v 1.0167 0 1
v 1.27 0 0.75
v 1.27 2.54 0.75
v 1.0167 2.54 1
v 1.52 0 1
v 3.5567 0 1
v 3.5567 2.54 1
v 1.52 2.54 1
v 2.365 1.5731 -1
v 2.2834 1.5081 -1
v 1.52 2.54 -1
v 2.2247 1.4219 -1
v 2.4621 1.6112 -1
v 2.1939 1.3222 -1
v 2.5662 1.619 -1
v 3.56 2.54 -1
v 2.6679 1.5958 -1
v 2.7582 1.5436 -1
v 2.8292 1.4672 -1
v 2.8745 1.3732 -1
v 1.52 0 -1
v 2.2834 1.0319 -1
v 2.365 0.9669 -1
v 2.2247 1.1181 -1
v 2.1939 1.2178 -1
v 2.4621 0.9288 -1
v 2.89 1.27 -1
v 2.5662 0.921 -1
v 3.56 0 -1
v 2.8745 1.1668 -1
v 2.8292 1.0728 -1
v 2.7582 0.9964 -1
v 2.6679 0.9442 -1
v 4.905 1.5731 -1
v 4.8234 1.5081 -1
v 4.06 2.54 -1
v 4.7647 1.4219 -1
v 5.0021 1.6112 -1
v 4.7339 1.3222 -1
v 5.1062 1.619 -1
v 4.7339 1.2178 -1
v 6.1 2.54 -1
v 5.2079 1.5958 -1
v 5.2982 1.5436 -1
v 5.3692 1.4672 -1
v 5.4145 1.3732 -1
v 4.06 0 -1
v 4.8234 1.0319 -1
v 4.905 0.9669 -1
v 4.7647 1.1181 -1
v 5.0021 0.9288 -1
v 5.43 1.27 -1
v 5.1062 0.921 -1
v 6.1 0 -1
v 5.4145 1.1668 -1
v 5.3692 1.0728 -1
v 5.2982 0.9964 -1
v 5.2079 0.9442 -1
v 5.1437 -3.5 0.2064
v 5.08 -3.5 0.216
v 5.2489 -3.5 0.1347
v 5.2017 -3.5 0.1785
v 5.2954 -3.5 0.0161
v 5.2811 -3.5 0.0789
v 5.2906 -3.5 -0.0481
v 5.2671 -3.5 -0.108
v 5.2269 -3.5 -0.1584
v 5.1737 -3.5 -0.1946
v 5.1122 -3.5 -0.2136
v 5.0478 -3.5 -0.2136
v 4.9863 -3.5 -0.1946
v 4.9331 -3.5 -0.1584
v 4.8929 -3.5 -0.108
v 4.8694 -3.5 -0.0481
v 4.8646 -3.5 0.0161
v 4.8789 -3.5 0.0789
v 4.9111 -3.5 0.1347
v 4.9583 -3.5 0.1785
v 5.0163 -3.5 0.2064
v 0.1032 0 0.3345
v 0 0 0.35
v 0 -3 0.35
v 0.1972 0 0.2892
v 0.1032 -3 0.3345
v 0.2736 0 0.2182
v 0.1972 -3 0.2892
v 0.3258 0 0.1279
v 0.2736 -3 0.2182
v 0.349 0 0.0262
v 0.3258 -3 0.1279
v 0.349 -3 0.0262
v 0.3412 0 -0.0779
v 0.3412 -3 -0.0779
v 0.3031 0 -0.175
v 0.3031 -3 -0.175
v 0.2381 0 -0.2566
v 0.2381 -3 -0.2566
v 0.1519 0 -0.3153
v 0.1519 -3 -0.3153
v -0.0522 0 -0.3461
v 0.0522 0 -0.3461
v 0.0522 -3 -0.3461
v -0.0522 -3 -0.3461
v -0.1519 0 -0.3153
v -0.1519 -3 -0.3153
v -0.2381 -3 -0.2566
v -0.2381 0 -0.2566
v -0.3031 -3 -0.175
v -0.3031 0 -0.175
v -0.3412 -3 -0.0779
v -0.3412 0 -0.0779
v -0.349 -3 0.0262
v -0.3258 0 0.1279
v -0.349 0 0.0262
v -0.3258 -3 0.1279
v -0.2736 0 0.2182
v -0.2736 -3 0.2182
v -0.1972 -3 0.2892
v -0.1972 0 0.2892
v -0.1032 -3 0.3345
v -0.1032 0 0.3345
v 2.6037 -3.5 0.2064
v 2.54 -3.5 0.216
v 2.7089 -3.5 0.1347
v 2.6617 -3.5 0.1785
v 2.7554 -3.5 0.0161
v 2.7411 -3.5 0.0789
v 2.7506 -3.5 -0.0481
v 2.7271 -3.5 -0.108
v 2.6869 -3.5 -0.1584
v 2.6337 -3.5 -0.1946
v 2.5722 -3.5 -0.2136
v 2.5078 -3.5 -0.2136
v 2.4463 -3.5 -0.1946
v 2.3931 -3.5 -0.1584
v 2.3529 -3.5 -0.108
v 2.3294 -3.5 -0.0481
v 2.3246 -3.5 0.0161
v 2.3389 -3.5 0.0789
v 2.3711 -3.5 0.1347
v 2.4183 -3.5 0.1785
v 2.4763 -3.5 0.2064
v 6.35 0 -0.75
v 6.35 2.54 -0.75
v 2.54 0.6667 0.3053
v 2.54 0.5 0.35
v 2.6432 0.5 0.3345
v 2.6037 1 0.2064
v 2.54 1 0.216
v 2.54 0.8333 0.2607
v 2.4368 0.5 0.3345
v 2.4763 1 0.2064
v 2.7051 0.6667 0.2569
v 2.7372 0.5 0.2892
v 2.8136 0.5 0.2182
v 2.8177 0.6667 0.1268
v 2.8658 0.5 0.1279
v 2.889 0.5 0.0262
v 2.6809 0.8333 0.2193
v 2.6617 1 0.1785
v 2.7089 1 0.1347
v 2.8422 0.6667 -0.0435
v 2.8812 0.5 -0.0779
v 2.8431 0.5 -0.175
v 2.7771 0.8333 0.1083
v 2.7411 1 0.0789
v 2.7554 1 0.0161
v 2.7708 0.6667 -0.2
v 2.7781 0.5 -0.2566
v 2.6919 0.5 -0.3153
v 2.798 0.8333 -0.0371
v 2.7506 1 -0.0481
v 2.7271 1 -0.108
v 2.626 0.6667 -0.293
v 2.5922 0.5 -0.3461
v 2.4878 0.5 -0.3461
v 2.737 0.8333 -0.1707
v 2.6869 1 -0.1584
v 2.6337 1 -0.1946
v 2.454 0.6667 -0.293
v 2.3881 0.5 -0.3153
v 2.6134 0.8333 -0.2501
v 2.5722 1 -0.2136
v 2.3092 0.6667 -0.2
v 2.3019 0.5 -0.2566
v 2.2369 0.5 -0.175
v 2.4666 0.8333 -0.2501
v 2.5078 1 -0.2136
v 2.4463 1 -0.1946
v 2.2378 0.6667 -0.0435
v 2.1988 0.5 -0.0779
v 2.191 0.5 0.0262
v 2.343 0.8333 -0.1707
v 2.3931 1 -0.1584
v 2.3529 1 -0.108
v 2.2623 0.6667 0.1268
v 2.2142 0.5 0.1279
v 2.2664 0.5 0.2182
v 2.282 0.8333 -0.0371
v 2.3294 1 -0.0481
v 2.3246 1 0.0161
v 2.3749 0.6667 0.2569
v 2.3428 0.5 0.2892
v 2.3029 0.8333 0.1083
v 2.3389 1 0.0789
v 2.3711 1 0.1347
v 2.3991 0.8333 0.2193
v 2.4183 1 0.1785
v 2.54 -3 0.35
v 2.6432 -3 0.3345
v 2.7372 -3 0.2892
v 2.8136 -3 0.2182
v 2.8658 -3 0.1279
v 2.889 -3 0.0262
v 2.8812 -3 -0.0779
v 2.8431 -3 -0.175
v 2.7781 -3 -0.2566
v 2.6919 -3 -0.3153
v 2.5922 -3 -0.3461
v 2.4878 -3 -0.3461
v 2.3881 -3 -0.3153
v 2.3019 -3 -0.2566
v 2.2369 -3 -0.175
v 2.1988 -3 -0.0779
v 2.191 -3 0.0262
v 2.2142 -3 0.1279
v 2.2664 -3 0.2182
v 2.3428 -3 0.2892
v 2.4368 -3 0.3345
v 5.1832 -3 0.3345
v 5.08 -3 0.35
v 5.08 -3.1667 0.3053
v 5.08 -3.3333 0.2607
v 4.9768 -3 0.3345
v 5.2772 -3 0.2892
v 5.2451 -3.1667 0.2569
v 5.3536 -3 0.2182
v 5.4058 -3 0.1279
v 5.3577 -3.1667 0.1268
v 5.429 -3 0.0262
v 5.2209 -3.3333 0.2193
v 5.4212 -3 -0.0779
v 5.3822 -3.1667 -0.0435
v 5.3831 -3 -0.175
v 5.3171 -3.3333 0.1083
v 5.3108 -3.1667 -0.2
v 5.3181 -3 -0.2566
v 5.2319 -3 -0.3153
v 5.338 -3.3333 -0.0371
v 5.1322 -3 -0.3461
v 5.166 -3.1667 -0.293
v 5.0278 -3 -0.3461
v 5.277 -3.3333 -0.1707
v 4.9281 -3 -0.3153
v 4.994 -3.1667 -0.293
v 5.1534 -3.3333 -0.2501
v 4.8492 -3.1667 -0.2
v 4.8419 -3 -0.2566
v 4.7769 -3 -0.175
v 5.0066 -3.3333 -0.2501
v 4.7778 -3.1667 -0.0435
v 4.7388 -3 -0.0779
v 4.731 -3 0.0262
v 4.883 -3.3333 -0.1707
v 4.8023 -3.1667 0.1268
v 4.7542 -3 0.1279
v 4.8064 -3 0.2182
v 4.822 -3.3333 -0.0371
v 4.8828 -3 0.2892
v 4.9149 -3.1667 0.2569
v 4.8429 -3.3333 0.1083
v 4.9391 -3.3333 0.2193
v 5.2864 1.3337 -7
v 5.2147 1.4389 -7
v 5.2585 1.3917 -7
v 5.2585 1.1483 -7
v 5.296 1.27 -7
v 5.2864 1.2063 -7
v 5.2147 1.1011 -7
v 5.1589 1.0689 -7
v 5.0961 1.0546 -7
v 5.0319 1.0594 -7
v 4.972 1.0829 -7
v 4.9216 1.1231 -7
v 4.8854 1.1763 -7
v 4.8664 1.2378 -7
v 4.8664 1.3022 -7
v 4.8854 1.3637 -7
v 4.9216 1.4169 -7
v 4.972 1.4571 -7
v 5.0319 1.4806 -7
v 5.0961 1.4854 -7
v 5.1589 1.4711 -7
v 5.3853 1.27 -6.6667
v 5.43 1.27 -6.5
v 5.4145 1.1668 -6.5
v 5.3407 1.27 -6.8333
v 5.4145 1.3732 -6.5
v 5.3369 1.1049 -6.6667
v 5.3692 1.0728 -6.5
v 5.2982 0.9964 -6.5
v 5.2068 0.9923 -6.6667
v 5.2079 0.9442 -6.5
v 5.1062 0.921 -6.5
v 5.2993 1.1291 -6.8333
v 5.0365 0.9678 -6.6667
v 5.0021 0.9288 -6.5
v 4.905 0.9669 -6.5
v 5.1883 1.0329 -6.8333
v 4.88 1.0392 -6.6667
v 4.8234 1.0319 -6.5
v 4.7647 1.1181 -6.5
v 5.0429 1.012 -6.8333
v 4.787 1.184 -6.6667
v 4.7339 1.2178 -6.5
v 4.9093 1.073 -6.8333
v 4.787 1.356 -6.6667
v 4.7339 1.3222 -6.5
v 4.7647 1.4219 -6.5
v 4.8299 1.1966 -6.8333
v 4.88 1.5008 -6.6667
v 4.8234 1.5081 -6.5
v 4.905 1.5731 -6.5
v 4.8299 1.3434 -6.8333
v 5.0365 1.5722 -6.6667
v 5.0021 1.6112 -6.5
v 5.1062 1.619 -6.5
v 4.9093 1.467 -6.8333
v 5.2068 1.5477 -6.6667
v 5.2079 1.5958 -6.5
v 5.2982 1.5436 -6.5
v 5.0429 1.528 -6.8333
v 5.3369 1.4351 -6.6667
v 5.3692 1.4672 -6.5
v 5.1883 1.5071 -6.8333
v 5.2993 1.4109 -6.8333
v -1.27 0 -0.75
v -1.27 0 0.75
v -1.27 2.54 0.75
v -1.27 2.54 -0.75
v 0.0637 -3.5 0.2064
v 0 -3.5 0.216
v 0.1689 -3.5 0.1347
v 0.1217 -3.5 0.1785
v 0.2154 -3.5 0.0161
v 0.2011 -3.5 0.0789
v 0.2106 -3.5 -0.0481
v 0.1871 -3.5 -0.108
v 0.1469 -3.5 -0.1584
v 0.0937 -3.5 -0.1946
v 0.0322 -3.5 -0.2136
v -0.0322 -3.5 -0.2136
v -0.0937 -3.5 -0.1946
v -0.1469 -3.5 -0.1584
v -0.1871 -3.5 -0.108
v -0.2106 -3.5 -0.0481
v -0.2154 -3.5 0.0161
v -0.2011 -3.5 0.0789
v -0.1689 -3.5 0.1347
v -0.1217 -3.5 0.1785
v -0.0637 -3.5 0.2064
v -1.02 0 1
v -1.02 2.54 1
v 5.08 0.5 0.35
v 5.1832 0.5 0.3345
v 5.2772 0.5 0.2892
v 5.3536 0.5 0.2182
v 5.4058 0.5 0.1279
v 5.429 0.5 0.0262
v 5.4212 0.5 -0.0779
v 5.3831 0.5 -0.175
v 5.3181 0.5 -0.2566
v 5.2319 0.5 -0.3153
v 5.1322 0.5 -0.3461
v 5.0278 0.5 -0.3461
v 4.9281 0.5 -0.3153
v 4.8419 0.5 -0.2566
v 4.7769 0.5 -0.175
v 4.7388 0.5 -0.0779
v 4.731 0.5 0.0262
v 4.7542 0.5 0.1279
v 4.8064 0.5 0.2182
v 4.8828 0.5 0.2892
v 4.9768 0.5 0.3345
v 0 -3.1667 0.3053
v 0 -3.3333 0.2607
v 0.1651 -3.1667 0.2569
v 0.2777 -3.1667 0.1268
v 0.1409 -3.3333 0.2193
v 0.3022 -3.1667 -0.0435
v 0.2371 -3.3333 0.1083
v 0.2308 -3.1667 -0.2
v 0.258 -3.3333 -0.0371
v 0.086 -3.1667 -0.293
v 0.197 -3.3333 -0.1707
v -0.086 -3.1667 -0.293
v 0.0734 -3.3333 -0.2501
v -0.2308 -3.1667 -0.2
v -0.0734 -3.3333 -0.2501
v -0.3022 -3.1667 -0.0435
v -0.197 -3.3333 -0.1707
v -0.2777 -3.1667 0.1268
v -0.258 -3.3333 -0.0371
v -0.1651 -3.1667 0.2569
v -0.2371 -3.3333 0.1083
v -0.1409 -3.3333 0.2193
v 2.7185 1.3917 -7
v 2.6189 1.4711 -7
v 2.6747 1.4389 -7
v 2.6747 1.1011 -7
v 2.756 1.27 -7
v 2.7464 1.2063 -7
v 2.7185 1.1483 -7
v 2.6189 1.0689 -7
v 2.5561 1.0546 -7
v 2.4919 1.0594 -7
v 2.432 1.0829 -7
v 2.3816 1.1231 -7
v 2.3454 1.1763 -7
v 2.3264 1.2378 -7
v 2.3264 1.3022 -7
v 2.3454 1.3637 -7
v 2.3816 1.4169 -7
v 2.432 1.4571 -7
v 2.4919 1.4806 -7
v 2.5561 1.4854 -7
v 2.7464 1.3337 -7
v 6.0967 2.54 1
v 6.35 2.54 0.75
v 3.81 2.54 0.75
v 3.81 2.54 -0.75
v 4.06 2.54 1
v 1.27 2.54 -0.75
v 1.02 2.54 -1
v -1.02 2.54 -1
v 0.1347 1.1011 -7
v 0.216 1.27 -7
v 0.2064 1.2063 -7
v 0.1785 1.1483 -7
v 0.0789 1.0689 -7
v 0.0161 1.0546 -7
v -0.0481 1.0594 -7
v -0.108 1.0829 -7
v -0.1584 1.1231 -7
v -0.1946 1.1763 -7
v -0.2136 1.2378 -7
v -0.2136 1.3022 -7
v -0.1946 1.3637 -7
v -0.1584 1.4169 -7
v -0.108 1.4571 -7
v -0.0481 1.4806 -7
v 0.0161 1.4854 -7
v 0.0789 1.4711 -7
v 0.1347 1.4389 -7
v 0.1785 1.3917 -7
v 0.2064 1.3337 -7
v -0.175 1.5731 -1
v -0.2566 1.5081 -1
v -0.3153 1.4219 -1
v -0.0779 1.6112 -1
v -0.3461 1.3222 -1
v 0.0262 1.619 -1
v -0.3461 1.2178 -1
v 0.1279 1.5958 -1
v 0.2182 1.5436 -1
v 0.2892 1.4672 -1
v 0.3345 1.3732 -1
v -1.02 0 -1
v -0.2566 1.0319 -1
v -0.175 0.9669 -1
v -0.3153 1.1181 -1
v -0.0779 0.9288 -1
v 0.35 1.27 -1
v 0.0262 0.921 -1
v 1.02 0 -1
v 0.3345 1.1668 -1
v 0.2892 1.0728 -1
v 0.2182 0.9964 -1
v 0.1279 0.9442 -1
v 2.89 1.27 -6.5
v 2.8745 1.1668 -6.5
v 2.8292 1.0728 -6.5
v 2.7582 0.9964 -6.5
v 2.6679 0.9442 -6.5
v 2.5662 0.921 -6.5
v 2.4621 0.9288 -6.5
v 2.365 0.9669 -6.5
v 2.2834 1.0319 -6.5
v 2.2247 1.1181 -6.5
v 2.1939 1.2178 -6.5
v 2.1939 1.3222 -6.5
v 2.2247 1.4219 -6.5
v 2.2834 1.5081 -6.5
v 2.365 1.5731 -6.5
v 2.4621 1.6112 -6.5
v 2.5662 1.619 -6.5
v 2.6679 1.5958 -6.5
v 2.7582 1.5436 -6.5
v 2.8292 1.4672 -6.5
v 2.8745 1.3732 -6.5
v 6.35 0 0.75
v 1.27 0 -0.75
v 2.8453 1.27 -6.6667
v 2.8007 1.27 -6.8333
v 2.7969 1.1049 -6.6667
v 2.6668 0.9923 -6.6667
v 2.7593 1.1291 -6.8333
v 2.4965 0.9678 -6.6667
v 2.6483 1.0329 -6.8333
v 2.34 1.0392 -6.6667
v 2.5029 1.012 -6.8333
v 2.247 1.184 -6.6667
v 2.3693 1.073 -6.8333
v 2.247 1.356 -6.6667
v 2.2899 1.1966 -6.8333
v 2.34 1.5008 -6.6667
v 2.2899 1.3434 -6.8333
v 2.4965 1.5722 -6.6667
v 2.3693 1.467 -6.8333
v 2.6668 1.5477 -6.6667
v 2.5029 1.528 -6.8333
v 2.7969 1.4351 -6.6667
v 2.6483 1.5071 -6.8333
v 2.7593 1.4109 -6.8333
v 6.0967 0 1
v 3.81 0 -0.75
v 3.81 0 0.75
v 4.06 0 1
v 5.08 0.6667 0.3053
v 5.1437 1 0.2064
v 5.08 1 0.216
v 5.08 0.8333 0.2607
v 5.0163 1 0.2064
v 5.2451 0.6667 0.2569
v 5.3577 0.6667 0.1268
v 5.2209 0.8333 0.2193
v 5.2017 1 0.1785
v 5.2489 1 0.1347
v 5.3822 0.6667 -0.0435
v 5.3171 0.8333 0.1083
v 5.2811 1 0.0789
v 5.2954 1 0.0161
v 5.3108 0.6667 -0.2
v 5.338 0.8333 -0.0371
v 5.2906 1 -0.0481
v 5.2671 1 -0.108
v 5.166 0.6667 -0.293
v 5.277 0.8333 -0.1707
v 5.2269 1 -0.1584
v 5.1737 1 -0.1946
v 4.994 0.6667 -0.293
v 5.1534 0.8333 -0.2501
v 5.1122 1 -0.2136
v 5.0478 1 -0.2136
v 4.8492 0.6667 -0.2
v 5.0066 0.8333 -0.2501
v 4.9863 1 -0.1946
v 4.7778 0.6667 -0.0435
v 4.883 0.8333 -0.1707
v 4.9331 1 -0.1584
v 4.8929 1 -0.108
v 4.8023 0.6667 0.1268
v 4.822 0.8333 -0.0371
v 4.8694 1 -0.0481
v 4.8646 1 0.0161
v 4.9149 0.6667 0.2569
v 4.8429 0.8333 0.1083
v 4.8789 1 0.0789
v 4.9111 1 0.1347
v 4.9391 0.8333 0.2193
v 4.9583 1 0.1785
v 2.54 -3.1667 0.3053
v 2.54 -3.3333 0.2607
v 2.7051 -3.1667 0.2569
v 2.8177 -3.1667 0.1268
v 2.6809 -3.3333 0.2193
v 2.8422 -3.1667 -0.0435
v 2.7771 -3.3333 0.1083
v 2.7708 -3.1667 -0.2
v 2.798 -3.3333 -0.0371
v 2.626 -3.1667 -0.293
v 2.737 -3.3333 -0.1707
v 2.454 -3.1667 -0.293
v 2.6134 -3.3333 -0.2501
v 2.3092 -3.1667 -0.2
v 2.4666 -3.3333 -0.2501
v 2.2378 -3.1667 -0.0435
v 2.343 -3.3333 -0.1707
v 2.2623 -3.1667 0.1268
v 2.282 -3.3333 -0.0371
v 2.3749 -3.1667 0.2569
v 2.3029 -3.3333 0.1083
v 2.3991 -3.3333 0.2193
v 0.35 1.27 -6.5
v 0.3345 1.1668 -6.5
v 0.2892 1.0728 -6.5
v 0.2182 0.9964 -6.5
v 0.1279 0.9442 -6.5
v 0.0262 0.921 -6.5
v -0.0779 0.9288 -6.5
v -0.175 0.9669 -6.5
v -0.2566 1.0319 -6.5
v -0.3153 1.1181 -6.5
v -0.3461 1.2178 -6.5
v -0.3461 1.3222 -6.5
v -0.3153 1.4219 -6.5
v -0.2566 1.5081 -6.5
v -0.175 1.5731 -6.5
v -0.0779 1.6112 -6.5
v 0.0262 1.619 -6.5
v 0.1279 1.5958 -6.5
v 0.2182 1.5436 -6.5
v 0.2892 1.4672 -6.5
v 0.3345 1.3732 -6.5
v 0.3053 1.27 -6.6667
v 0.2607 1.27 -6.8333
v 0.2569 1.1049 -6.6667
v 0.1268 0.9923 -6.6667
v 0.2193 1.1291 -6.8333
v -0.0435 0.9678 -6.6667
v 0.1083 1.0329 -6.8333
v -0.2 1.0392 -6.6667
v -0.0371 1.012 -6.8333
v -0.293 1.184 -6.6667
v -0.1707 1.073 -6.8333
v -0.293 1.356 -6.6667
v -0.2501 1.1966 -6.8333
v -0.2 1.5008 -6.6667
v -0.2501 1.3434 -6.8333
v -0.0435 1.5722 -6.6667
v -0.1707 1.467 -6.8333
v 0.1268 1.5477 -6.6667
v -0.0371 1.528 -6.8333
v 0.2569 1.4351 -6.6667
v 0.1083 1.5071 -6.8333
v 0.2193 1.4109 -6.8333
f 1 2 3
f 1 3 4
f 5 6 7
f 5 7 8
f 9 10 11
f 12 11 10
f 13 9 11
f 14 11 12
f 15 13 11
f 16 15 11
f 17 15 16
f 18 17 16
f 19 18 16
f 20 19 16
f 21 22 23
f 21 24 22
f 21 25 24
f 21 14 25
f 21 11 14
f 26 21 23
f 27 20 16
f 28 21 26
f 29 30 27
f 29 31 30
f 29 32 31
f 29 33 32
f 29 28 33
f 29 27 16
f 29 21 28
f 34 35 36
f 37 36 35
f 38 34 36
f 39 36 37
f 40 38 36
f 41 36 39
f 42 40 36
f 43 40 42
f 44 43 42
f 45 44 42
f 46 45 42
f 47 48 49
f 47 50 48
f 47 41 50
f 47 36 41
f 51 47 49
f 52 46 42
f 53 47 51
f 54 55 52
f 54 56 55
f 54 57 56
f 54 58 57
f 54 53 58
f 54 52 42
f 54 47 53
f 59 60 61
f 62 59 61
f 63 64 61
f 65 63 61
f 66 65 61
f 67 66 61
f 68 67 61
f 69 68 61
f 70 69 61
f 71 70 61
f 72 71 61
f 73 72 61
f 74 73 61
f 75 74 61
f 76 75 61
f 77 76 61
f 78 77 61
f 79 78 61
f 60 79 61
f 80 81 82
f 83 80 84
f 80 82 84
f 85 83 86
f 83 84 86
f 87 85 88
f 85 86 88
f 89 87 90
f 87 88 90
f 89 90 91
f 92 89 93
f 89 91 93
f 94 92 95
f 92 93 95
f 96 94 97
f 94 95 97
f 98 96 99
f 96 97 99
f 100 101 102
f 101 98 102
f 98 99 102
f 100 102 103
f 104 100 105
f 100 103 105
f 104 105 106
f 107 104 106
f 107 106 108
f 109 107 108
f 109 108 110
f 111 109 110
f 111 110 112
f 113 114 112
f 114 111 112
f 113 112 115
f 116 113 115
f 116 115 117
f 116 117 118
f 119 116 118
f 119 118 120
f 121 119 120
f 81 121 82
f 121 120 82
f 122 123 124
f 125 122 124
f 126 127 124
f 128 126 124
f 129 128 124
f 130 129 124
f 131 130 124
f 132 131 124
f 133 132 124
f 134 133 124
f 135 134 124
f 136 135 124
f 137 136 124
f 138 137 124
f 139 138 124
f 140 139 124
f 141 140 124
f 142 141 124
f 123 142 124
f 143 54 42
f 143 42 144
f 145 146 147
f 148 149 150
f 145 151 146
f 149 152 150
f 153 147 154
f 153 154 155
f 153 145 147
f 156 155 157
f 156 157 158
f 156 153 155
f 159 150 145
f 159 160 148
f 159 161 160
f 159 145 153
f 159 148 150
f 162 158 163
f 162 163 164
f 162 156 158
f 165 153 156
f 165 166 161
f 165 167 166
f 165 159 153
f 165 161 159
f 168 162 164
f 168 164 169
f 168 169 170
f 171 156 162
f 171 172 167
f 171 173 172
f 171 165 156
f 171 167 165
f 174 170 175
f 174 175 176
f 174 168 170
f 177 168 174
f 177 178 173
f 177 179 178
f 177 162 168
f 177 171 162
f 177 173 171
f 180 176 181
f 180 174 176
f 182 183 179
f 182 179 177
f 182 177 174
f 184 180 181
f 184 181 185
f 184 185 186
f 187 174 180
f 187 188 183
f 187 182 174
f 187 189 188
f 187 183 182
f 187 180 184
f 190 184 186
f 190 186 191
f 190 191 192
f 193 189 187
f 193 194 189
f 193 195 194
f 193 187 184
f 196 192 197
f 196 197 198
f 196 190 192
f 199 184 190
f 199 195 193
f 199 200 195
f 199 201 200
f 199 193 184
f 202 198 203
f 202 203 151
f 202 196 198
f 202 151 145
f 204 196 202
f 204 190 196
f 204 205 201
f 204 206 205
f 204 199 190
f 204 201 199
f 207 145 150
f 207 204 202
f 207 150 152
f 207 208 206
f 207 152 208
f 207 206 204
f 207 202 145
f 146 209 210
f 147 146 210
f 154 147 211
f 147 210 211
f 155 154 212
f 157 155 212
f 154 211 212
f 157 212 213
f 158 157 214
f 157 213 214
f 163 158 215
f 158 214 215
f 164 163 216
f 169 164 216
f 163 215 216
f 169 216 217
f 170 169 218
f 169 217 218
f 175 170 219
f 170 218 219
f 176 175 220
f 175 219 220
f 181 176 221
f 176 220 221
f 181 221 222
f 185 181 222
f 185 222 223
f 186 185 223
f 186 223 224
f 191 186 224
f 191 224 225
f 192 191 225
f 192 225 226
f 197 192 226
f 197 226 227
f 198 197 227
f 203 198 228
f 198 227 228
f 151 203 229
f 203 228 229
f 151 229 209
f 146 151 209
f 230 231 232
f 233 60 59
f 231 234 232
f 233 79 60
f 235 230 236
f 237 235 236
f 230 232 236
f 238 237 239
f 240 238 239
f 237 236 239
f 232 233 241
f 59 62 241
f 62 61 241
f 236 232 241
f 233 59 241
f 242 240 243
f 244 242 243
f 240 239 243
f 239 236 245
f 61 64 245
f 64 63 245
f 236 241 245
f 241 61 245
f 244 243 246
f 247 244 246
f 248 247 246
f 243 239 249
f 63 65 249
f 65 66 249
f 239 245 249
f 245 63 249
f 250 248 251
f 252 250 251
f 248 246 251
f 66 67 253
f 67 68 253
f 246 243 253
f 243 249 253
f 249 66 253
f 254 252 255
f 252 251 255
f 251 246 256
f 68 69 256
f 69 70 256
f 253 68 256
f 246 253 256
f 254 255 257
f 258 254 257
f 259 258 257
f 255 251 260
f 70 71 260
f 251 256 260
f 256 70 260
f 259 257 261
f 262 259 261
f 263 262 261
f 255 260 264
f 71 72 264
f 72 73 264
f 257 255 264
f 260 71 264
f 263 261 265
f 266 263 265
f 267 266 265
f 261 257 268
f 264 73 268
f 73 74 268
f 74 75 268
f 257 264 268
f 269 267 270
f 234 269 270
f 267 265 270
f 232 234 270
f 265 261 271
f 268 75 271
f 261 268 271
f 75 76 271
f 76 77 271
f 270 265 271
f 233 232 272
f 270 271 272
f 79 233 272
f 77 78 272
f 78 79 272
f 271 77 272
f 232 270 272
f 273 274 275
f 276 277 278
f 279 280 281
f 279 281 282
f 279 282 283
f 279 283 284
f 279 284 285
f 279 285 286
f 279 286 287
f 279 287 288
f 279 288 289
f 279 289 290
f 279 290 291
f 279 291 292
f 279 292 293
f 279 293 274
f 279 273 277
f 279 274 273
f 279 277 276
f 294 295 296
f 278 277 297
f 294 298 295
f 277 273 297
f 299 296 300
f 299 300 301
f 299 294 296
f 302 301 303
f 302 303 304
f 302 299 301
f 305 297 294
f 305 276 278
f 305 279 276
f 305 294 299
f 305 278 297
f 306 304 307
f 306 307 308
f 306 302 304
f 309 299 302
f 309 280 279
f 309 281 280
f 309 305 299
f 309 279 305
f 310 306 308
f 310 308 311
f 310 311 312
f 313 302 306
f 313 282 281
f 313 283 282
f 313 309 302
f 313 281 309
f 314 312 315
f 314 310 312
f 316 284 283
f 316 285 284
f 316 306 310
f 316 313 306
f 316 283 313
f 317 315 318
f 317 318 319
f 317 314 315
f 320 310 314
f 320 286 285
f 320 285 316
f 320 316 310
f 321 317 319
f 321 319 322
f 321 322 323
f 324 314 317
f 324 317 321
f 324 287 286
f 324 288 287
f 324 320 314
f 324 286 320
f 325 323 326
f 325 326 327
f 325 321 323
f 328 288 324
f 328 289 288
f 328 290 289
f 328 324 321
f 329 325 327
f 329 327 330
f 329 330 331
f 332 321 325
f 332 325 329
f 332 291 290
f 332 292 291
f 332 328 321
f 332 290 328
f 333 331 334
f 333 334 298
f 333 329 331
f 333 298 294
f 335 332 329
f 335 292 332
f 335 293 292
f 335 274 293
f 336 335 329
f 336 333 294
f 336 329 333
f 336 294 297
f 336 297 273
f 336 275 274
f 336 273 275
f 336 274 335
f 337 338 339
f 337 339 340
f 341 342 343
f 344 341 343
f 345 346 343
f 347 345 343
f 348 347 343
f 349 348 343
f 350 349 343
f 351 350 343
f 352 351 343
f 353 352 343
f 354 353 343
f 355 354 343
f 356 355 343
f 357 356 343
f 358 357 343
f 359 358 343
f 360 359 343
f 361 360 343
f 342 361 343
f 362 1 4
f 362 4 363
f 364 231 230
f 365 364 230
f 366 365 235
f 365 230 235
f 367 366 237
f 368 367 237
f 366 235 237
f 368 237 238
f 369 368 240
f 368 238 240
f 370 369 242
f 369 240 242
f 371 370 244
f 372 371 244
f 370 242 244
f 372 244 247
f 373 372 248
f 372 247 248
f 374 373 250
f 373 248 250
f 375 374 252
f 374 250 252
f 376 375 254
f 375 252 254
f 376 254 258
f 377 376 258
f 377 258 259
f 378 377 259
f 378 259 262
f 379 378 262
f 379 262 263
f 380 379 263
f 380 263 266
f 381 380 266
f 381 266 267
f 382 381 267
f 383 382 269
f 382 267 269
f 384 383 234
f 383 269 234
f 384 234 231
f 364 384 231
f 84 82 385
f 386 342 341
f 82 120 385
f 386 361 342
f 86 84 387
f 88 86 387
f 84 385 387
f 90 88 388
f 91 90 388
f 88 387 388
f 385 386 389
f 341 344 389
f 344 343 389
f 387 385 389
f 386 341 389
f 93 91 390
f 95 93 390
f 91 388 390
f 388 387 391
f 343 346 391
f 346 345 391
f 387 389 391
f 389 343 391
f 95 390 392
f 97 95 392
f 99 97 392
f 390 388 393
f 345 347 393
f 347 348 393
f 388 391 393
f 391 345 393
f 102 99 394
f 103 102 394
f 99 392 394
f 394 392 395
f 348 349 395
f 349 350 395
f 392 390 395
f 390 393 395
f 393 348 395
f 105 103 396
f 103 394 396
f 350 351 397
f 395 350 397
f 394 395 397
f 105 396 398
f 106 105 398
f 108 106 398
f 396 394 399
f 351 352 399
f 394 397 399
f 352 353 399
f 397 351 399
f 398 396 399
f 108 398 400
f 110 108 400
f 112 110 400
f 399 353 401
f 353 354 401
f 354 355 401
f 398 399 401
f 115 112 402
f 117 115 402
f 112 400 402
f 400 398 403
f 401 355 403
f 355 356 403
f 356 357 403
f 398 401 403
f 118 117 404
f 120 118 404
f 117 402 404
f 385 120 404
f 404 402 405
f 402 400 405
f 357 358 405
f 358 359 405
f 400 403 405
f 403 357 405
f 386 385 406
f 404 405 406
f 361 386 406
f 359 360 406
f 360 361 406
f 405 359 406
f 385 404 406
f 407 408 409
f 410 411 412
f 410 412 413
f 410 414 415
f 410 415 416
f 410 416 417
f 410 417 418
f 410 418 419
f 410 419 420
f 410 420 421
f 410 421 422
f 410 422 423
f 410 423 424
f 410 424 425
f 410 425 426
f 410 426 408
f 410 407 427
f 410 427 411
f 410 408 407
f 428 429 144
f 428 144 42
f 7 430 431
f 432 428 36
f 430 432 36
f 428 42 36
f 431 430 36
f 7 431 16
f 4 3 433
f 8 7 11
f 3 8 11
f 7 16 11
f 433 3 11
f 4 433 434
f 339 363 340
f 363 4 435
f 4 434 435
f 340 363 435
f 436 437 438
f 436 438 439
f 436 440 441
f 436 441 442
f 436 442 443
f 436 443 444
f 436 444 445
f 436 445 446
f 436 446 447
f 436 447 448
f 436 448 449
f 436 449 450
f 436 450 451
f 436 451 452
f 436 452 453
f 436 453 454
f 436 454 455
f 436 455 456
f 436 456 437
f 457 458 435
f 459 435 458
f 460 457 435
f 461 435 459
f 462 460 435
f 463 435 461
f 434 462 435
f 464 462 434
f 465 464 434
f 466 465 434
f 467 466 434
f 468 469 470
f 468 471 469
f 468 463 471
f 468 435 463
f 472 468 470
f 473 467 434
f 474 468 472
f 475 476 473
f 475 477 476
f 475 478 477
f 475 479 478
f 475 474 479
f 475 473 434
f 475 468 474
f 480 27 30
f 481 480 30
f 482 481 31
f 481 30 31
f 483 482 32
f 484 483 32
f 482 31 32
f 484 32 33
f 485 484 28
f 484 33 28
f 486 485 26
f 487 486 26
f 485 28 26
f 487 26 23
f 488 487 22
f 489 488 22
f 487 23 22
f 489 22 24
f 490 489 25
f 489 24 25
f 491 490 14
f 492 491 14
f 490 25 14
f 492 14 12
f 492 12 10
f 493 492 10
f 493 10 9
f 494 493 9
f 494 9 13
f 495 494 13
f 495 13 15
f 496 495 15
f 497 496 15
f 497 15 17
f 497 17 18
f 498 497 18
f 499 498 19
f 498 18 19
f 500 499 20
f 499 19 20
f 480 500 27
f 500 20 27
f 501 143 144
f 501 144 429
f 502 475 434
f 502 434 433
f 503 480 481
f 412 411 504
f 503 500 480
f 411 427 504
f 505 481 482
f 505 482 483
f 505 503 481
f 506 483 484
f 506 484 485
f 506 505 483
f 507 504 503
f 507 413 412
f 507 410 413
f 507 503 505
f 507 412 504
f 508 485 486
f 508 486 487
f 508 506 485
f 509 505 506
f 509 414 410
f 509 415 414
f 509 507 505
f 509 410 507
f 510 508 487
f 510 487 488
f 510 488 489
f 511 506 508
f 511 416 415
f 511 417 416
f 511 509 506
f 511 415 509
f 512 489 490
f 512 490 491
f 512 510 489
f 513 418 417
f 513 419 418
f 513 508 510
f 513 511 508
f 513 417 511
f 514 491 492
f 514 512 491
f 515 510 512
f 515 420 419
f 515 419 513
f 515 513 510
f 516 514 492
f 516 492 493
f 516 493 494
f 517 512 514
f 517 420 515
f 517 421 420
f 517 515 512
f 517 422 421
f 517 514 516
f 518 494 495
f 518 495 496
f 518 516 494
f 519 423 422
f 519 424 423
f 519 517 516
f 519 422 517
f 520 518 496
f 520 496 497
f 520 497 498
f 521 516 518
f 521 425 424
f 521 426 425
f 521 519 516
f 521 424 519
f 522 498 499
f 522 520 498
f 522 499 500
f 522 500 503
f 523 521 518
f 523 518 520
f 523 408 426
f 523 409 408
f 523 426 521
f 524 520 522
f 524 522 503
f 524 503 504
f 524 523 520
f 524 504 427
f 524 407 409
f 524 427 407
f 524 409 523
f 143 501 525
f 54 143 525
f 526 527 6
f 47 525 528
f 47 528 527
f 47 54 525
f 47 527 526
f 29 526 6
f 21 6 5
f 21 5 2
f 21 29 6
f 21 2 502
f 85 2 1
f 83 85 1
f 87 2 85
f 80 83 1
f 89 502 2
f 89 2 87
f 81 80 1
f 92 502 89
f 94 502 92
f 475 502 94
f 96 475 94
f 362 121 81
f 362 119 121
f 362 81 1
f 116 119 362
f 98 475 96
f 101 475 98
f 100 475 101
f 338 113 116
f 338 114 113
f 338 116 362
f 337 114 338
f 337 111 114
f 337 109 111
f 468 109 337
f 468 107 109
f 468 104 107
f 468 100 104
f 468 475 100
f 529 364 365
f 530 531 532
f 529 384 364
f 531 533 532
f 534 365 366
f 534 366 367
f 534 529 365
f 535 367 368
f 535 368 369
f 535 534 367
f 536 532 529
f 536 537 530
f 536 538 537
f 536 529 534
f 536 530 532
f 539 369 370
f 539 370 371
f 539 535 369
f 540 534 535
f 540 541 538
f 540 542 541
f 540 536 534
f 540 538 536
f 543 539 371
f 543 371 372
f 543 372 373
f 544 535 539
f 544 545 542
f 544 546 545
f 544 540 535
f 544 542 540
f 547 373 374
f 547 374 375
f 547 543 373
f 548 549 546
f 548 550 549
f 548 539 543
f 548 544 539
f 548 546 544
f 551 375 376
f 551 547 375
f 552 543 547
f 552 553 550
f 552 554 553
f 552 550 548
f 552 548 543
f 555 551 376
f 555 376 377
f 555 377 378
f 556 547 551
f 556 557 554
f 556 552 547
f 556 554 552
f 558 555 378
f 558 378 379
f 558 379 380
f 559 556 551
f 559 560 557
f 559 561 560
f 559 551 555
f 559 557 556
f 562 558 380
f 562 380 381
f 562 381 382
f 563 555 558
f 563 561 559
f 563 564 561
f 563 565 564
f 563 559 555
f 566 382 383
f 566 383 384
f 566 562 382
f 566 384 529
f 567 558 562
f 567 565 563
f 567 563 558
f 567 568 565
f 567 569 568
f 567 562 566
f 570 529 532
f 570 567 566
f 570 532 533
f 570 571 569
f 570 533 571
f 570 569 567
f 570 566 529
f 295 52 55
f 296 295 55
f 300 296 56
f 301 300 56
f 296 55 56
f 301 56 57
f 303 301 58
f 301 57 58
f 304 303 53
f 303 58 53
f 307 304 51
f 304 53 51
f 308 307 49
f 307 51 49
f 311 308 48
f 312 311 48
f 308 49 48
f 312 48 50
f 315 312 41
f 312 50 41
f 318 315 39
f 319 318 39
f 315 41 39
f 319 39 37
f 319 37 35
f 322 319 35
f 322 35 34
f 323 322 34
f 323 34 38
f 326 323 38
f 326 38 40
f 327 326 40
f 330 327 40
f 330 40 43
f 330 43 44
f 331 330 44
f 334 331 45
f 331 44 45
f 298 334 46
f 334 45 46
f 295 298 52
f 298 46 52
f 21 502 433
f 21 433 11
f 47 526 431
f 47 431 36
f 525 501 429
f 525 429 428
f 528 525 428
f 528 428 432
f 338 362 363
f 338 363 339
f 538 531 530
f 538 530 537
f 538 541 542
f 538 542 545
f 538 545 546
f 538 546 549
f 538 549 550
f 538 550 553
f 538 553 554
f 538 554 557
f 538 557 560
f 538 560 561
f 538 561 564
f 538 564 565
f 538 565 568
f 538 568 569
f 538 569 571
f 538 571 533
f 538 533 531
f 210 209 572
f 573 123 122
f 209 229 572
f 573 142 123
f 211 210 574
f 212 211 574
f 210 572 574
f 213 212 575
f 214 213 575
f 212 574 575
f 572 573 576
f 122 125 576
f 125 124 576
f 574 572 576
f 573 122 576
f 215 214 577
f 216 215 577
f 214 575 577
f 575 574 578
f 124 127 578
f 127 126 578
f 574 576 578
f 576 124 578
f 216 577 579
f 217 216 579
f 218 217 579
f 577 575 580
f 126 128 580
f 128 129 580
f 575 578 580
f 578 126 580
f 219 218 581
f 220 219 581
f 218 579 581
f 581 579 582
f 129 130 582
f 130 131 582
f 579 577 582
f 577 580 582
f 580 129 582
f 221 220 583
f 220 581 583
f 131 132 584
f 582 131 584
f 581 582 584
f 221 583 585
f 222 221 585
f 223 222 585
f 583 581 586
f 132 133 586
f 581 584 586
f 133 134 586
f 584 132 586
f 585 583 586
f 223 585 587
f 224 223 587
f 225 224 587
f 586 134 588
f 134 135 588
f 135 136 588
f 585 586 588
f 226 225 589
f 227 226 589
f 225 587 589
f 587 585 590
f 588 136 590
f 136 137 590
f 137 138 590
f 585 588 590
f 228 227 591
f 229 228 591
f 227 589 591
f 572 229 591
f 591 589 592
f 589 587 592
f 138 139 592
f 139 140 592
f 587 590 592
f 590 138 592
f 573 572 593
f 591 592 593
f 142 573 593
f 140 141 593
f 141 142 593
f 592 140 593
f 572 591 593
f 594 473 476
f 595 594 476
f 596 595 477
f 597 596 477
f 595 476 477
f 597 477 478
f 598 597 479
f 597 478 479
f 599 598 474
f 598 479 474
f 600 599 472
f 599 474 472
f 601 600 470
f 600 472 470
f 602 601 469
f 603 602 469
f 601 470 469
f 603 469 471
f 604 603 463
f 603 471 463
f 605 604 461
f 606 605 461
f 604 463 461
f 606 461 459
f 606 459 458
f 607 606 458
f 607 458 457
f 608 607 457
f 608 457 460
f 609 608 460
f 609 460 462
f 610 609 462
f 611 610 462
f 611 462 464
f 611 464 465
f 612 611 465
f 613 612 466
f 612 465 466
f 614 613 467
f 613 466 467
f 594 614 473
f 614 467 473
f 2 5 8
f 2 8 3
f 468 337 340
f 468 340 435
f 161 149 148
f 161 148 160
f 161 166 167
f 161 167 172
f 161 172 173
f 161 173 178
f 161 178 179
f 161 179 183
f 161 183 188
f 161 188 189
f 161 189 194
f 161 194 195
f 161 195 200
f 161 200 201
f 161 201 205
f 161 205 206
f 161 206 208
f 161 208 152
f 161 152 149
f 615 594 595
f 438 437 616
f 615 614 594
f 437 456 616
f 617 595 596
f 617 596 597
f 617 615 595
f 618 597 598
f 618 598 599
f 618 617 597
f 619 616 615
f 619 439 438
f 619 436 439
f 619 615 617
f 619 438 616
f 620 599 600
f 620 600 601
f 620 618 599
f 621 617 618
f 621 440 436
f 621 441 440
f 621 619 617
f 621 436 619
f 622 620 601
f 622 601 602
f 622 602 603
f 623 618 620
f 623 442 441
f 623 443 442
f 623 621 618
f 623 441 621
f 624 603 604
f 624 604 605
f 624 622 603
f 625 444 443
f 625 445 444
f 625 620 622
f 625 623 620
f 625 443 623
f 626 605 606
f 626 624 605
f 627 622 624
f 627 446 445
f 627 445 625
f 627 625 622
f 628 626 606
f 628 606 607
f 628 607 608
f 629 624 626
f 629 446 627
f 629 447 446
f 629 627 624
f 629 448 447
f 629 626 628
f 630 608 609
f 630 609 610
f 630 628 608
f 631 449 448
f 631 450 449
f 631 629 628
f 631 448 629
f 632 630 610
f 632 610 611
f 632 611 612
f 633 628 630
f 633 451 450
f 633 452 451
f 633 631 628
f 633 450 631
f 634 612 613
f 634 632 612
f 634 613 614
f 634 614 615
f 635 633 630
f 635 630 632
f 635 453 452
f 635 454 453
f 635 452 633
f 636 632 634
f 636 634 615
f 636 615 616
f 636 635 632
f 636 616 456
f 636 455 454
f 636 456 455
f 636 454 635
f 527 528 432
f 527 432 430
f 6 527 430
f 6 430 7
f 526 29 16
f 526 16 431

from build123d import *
from OCP.BRepFilletAPI import BRepFilletAPI_MakeChamfer

# Parameters (mm, degrees)
BOSS_EXTRU_1_DEPTH        = 1
BOSS_EXTRU_1_DEPTH_BACK   = 3.5
ESQUISSE1_R               = 0.35
BOSS_EXTRU_1_2_DEPTH      = 1
BOSS_EXTRU_1_2_DEPTH_BACK = 3.5
BOSS_EXTRU_1_3_DEPTH      = 1
BOSS_EXTRU_1_3_DEPTH_BACK = 3.5
CHANFREIN1_SIZE           = 0.5
CHANFREIN1_SIZE2          = 0.133974596
CHANFREIN2_SIZE           = 0.5
CHANFREIN2_SIZE2          = 0.133974596
CHANFREIN3_SIZE           = 0.5
CHANFREIN3_SIZE2          = 0.133974596
BOSS_EXTRU_2_DEPTH        = 2.54
ESQUISSE3_R               = 0.35
BOSS_EXTRU_3_DEPTH        = 6
CHANFREIN4_SIZE           = 0.5
CHANFREIN4_SIZE2          = 0.133974596


with BuildPart() as part:
    # Esquisse1 → Boss.-Extru.1 (new, two sides: drawn at the far end of the back side and taken through both)
    with BuildSketch(Plane(origin=(0, 0, 0), x_dir=(1, 0, 0), z_dir=(0, 1, 0)).offset(-BOSS_EXTRU_1_DEPTH_BACK)):
        with Locations(Location((0, 0, 0), (0, 0, 270))):
            Circle(ESQUISSE1_R)
    extrude(amount=BOSS_EXTRU_1_DEPTH + BOSS_EXTRU_1_DEPTH_BACK)

    # Chanfrein1: one chamfer whose edges measure the first distance from different faces: ONE call of the kernel's chamfer builder (chamfer() names one face for all edges)
    chanfrein1_edges_1 = [part.edges().sort_by_distance(p)[0] for p in [
        (0, -3.5, -0.35),
    ]]
    chanfrein1_side_1 = [part.faces().sort_by_distance(p)[0] for p in [
        (0, -1.75, -0.35),
    ]]
    chanfrein1_edges_2 = [part.edges().sort_by_distance(p)[0] for p in [
        (0, 1, -0.35),
    ]]
    chanfrein1_side_2 = [part.faces().sort_by_distance(p)[0] for p in [
        (0, 0.5, -0.35),
    ]]
    chanfrein1 = BRepFilletAPI_MakeChamfer(part.part.solid().wrapped)
    for e in chanfrein1_edges_1:
        chanfrein1.Add(CHANFREIN1_SIZE, CHANFREIN1_SIZE2, e.wrapped, chanfrein1_side_1[0].wrapped)  # the first distance lies on this face
    for e in chanfrein1_edges_2:
        chanfrein1.Add(CHANFREIN1_SIZE, CHANFREIN1_SIZE2, e.wrapped, chanfrein1_side_2[0].wrapped)  # the first distance lies on this face
    add(Compound.cast(chanfrein1.Shape()), mode=Mode.REPLACE)

    # Esquisse2 → Boss.-Extru.2 (add)
    with BuildSketch(Plane(origin=(0, 0, 0), x_dir=(1, 0, 0), z_dir=(0, 1, 0))):
        Polygon((-1.27, 0.75), (-1.02, 1), (1.02, 1), (1.27, 0.75), (1.52, 1), (3.56, 1), (3.81, 0.75), (4.06, 1), (6.1, 1), (6.35, 0.75), (6.35, -0.750018973), (6.096707403, -1.000018973), (4.06, -1.000018973), (3.81, -0.750018973), (3.556707403, -1.000018973), (1.52, -1.000018973), (1.27, -0.750018973), (1.016707403, -1.000018973), (-1.02, -1.000018973), (-1.27, -0.750018973), align=None)
    extrude(amount=BOSS_EXTRU_2_DEPTH)

    # Esquisse3 → Boss.-Extru.3 (add)
    with BuildSketch(Plane(origin=(0, 0, -1), x_dir=(-1, 0, 0), z_dir=(0, 0, -1))):
        with Locations(Location((-5.08, 1.27, 0), (0, 0, 180))):
            Circle(ESQUISSE3_R)
        with Locations(Location((-2.54, 1.27, 0), (0, 0, 180))):
            Circle(ESQUISSE3_R)
        with Locations(Location((0, 1.27, 0), (0, 0, 180))):
            Circle(ESQUISSE3_R)
    extrude(amount=BOSS_EXTRU_3_DEPTH)

    # Chanfrein4: one chamfer whose edges measure the first distance from different faces: ONE call of the kernel's chamfer builder (chamfer() names one face for all edges)
    chanfrein4_edges_1 = [part.edges().sort_by_distance(p)[0] for p in [
        (4.73, 1.27, -7),
    ]]
    chanfrein4_side_1 = [part.faces().sort_by_distance(p)[0] for p in [
        (4.73, 1.27, -4),
    ]]
    chanfrein4_edges_2 = [part.edges().sort_by_distance(p)[0] for p in [
        (2.19, 1.27, -7),
    ]]
    chanfrein4_side_2 = [part.faces().sort_by_distance(p)[0] for p in [
        (2.19, 1.27, -4),
    ]]
    chanfrein4_edges_3 = [part.edges().sort_by_distance(p)[0] for p in [
        (-0.35, 1.27, -7),
    ]]
    chanfrein4_side_3 = [part.faces().sort_by_distance(p)[0] for p in [
        (-0.35, 1.27, -4),
    ]]
    chanfrein4 = BRepFilletAPI_MakeChamfer(part.part.solid().wrapped)
    for e in chanfrein4_edges_1:
        chanfrein4.Add(CHANFREIN4_SIZE, CHANFREIN4_SIZE2, e.wrapped, chanfrein4_side_1[0].wrapped)  # the first distance lies on this face
    for e in chanfrein4_edges_2:
        chanfrein4.Add(CHANFREIN4_SIZE, CHANFREIN4_SIZE2, e.wrapped, chanfrein4_side_2[0].wrapped)  # the first distance lies on this face
    for e in chanfrein4_edges_3:
        chanfrein4.Add(CHANFREIN4_SIZE, CHANFREIN4_SIZE2, e.wrapped, chanfrein4_side_3[0].wrapped)  # the first distance lies on this face
    add(Compound.cast(chanfrein4.Shape()), mode=Mode.REPLACE)


with BuildPart() as body_2:
    # Esquisse1 → Boss.-Extru.1 2 (new, two sides: drawn at the far end of the back side and taken through both)
    with BuildSketch(Plane(origin=(0, 0, 0), x_dir=(1, 0, 0), z_dir=(0, 1, 0)).offset(-BOSS_EXTRU_1_2_DEPTH_BACK)):
        with Locations(Location((2.54, 0, 0), (0, 0, 270))):
            Circle(ESQUISSE1_R)
    extrude(amount=BOSS_EXTRU_1_2_DEPTH + BOSS_EXTRU_1_2_DEPTH_BACK)

    # Chanfrein2: one chamfer whose edges measure the first distance from different faces: ONE call of the kernel's chamfer builder (chamfer() names one face for all edges)
    chanfrein2_edges_1 = [body_2.edges().sort_by_distance(p)[0] for p in [
        (2.54, -3.5, -0.35),
    ]]
    chanfrein2_side_1 = [body_2.faces().sort_by_distance(p)[0] for p in [
        (2.54, -1.75, -0.35),
    ]]
    chanfrein2_edges_2 = [body_2.edges().sort_by_distance(p)[0] for p in [
        (2.54, 1, -0.35),
    ]]
    chanfrein2_side_2 = [body_2.faces().sort_by_distance(p)[0] for p in [
        (2.54, 0.5, -0.35),
    ]]
    chanfrein2 = BRepFilletAPI_MakeChamfer(body_2.part.solid().wrapped)
    for e in chanfrein2_edges_1:
        chanfrein2.Add(CHANFREIN2_SIZE, CHANFREIN2_SIZE2, e.wrapped, chanfrein2_side_1[0].wrapped)  # the first distance lies on this face
    for e in chanfrein2_edges_2:
        chanfrein2.Add(CHANFREIN2_SIZE, CHANFREIN2_SIZE2, e.wrapped, chanfrein2_side_2[0].wrapped)  # the first distance lies on this face
    add(Compound.cast(chanfrein2.Shape()), mode=Mode.REPLACE)


with BuildPart() as body_3:
    # Esquisse1 → Boss.-Extru.1 3 (new, two sides: drawn at the far end of the back side and taken through both)
    with BuildSketch(Plane(origin=(0, 0, 0), x_dir=(1, 0, 0), z_dir=(0, 1, 0)).offset(-BOSS_EXTRU_1_3_DEPTH_BACK)):
        with Locations(Location((5.08, 0, 0), (0, 0, 270))):
            Circle(ESQUISSE1_R)
    extrude(amount=BOSS_EXTRU_1_3_DEPTH + BOSS_EXTRU_1_3_DEPTH_BACK)

    # Chanfrein3: one chamfer whose edges measure the first distance from different faces: ONE call of the kernel's chamfer builder (chamfer() names one face for all edges)
    chanfrein3_edges_1 = [body_3.edges().sort_by_distance(p)[0] for p in [
        (5.08, -3.5, -0.35),
    ]]
    chanfrein3_side_1 = [body_3.faces().sort_by_distance(p)[0] for p in [
        (5.08, -1.75, -0.35),
    ]]
    chanfrein3_edges_2 = [body_3.edges().sort_by_distance(p)[0] for p in [
        (5.08, 1, -0.35),
    ]]
    chanfrein3_side_2 = [body_3.faces().sort_by_distance(p)[0] for p in [
        (5.08, 0.5, -0.35),
    ]]
    chanfrein3 = BRepFilletAPI_MakeChamfer(body_3.part.solid().wrapped)
    for e in chanfrein3_edges_1:
        chanfrein3.Add(CHANFREIN3_SIZE, CHANFREIN3_SIZE2, e.wrapped, chanfrein3_side_1[0].wrapped)  # the first distance lies on this face
    for e in chanfrein3_edges_2:
        chanfrein3.Add(CHANFREIN3_SIZE, CHANFREIN3_SIZE2, e.wrapped, chanfrein3_side_2[0].wrapped)  # the first distance lies on this face
    add(Compound.cast(chanfrein3.Shape()), mode=Mode.REPLACE)


solid = Compound([part.part, body_2.part, body_3.part])
